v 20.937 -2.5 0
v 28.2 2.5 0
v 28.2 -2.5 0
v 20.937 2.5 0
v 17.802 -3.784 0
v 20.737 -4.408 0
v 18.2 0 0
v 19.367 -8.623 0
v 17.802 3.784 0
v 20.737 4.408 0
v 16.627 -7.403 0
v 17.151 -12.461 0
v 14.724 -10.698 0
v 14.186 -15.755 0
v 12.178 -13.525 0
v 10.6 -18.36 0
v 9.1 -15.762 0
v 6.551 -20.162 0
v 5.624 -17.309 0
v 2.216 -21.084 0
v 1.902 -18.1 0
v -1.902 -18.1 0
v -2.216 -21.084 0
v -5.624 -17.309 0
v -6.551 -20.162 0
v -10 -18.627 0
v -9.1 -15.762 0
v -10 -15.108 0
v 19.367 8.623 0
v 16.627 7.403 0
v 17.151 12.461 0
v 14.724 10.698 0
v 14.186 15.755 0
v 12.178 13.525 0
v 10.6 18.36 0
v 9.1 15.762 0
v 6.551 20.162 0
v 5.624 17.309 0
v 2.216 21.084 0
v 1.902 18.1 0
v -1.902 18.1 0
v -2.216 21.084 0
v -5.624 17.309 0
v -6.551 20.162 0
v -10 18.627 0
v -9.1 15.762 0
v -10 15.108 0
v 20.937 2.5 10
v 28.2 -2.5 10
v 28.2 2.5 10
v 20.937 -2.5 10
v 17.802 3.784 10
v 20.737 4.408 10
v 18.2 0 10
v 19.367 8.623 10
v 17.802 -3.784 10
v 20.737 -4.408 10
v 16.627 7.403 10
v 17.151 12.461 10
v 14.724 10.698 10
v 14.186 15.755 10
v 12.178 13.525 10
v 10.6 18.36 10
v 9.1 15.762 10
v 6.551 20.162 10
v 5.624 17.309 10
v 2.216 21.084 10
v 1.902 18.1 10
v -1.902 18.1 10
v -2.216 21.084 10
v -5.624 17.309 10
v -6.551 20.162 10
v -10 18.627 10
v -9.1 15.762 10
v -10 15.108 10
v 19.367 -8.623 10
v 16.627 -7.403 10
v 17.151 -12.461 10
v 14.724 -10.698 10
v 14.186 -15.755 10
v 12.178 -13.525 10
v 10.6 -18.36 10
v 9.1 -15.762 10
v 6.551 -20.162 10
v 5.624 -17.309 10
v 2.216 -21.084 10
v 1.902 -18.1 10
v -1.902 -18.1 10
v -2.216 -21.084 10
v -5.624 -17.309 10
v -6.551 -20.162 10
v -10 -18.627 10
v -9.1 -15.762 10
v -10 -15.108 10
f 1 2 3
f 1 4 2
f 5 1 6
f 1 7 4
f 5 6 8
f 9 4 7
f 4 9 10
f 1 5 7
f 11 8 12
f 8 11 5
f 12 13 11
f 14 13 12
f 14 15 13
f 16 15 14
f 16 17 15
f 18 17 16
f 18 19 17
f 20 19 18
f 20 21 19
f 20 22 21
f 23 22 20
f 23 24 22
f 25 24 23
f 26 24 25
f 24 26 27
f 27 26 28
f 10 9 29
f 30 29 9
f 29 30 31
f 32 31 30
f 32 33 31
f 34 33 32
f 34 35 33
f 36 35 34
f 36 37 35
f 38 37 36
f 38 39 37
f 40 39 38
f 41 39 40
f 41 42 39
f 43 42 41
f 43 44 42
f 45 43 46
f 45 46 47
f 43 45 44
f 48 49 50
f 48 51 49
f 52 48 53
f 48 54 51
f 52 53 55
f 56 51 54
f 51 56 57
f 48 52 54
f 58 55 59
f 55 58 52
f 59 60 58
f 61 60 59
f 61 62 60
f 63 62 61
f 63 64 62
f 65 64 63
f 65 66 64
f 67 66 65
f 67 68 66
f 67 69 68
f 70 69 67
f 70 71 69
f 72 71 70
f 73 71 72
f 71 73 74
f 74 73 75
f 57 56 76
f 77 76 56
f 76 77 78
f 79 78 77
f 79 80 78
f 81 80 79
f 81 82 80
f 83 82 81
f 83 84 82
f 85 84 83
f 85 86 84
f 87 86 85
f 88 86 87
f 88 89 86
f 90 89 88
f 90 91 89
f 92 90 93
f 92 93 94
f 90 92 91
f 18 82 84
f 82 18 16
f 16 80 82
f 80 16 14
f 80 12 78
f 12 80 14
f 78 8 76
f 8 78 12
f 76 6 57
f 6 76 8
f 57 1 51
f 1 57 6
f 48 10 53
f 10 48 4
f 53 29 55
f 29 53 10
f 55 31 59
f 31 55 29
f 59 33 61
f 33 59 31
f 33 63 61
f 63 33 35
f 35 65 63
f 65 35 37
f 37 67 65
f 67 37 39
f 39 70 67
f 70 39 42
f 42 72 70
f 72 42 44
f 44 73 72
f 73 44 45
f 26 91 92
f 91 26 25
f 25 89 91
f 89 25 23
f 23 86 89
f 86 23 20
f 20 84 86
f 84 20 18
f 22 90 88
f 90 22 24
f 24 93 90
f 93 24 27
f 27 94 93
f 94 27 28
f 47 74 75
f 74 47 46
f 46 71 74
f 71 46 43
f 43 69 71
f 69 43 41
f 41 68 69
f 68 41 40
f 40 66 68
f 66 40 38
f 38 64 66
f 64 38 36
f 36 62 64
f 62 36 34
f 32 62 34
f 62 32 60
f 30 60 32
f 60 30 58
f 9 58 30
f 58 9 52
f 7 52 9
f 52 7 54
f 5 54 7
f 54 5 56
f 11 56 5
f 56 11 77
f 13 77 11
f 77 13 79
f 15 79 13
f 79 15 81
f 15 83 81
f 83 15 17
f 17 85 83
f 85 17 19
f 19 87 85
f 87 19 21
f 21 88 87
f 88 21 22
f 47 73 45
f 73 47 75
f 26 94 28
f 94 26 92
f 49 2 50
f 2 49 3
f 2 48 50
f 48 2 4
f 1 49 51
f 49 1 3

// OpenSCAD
d_inner=36.4;
w=3;
h=10;

d_outer=2*w+d_inner;
r_outer=d_outer/2;
r_inner = d_inner/2;

mount = 5;

difference(){
  linear_extrude(height=h){
    difference(){
      circle(d=d_outer);
      circle(d=d_inner);
    }
  }


  translate([0-50,-20,-1]){ // adj here
    cube([40,40,12], center=false);
  }
}

translate([r_inner,-mount/2,0])
cube([mount+5,mount,h],center=false);
